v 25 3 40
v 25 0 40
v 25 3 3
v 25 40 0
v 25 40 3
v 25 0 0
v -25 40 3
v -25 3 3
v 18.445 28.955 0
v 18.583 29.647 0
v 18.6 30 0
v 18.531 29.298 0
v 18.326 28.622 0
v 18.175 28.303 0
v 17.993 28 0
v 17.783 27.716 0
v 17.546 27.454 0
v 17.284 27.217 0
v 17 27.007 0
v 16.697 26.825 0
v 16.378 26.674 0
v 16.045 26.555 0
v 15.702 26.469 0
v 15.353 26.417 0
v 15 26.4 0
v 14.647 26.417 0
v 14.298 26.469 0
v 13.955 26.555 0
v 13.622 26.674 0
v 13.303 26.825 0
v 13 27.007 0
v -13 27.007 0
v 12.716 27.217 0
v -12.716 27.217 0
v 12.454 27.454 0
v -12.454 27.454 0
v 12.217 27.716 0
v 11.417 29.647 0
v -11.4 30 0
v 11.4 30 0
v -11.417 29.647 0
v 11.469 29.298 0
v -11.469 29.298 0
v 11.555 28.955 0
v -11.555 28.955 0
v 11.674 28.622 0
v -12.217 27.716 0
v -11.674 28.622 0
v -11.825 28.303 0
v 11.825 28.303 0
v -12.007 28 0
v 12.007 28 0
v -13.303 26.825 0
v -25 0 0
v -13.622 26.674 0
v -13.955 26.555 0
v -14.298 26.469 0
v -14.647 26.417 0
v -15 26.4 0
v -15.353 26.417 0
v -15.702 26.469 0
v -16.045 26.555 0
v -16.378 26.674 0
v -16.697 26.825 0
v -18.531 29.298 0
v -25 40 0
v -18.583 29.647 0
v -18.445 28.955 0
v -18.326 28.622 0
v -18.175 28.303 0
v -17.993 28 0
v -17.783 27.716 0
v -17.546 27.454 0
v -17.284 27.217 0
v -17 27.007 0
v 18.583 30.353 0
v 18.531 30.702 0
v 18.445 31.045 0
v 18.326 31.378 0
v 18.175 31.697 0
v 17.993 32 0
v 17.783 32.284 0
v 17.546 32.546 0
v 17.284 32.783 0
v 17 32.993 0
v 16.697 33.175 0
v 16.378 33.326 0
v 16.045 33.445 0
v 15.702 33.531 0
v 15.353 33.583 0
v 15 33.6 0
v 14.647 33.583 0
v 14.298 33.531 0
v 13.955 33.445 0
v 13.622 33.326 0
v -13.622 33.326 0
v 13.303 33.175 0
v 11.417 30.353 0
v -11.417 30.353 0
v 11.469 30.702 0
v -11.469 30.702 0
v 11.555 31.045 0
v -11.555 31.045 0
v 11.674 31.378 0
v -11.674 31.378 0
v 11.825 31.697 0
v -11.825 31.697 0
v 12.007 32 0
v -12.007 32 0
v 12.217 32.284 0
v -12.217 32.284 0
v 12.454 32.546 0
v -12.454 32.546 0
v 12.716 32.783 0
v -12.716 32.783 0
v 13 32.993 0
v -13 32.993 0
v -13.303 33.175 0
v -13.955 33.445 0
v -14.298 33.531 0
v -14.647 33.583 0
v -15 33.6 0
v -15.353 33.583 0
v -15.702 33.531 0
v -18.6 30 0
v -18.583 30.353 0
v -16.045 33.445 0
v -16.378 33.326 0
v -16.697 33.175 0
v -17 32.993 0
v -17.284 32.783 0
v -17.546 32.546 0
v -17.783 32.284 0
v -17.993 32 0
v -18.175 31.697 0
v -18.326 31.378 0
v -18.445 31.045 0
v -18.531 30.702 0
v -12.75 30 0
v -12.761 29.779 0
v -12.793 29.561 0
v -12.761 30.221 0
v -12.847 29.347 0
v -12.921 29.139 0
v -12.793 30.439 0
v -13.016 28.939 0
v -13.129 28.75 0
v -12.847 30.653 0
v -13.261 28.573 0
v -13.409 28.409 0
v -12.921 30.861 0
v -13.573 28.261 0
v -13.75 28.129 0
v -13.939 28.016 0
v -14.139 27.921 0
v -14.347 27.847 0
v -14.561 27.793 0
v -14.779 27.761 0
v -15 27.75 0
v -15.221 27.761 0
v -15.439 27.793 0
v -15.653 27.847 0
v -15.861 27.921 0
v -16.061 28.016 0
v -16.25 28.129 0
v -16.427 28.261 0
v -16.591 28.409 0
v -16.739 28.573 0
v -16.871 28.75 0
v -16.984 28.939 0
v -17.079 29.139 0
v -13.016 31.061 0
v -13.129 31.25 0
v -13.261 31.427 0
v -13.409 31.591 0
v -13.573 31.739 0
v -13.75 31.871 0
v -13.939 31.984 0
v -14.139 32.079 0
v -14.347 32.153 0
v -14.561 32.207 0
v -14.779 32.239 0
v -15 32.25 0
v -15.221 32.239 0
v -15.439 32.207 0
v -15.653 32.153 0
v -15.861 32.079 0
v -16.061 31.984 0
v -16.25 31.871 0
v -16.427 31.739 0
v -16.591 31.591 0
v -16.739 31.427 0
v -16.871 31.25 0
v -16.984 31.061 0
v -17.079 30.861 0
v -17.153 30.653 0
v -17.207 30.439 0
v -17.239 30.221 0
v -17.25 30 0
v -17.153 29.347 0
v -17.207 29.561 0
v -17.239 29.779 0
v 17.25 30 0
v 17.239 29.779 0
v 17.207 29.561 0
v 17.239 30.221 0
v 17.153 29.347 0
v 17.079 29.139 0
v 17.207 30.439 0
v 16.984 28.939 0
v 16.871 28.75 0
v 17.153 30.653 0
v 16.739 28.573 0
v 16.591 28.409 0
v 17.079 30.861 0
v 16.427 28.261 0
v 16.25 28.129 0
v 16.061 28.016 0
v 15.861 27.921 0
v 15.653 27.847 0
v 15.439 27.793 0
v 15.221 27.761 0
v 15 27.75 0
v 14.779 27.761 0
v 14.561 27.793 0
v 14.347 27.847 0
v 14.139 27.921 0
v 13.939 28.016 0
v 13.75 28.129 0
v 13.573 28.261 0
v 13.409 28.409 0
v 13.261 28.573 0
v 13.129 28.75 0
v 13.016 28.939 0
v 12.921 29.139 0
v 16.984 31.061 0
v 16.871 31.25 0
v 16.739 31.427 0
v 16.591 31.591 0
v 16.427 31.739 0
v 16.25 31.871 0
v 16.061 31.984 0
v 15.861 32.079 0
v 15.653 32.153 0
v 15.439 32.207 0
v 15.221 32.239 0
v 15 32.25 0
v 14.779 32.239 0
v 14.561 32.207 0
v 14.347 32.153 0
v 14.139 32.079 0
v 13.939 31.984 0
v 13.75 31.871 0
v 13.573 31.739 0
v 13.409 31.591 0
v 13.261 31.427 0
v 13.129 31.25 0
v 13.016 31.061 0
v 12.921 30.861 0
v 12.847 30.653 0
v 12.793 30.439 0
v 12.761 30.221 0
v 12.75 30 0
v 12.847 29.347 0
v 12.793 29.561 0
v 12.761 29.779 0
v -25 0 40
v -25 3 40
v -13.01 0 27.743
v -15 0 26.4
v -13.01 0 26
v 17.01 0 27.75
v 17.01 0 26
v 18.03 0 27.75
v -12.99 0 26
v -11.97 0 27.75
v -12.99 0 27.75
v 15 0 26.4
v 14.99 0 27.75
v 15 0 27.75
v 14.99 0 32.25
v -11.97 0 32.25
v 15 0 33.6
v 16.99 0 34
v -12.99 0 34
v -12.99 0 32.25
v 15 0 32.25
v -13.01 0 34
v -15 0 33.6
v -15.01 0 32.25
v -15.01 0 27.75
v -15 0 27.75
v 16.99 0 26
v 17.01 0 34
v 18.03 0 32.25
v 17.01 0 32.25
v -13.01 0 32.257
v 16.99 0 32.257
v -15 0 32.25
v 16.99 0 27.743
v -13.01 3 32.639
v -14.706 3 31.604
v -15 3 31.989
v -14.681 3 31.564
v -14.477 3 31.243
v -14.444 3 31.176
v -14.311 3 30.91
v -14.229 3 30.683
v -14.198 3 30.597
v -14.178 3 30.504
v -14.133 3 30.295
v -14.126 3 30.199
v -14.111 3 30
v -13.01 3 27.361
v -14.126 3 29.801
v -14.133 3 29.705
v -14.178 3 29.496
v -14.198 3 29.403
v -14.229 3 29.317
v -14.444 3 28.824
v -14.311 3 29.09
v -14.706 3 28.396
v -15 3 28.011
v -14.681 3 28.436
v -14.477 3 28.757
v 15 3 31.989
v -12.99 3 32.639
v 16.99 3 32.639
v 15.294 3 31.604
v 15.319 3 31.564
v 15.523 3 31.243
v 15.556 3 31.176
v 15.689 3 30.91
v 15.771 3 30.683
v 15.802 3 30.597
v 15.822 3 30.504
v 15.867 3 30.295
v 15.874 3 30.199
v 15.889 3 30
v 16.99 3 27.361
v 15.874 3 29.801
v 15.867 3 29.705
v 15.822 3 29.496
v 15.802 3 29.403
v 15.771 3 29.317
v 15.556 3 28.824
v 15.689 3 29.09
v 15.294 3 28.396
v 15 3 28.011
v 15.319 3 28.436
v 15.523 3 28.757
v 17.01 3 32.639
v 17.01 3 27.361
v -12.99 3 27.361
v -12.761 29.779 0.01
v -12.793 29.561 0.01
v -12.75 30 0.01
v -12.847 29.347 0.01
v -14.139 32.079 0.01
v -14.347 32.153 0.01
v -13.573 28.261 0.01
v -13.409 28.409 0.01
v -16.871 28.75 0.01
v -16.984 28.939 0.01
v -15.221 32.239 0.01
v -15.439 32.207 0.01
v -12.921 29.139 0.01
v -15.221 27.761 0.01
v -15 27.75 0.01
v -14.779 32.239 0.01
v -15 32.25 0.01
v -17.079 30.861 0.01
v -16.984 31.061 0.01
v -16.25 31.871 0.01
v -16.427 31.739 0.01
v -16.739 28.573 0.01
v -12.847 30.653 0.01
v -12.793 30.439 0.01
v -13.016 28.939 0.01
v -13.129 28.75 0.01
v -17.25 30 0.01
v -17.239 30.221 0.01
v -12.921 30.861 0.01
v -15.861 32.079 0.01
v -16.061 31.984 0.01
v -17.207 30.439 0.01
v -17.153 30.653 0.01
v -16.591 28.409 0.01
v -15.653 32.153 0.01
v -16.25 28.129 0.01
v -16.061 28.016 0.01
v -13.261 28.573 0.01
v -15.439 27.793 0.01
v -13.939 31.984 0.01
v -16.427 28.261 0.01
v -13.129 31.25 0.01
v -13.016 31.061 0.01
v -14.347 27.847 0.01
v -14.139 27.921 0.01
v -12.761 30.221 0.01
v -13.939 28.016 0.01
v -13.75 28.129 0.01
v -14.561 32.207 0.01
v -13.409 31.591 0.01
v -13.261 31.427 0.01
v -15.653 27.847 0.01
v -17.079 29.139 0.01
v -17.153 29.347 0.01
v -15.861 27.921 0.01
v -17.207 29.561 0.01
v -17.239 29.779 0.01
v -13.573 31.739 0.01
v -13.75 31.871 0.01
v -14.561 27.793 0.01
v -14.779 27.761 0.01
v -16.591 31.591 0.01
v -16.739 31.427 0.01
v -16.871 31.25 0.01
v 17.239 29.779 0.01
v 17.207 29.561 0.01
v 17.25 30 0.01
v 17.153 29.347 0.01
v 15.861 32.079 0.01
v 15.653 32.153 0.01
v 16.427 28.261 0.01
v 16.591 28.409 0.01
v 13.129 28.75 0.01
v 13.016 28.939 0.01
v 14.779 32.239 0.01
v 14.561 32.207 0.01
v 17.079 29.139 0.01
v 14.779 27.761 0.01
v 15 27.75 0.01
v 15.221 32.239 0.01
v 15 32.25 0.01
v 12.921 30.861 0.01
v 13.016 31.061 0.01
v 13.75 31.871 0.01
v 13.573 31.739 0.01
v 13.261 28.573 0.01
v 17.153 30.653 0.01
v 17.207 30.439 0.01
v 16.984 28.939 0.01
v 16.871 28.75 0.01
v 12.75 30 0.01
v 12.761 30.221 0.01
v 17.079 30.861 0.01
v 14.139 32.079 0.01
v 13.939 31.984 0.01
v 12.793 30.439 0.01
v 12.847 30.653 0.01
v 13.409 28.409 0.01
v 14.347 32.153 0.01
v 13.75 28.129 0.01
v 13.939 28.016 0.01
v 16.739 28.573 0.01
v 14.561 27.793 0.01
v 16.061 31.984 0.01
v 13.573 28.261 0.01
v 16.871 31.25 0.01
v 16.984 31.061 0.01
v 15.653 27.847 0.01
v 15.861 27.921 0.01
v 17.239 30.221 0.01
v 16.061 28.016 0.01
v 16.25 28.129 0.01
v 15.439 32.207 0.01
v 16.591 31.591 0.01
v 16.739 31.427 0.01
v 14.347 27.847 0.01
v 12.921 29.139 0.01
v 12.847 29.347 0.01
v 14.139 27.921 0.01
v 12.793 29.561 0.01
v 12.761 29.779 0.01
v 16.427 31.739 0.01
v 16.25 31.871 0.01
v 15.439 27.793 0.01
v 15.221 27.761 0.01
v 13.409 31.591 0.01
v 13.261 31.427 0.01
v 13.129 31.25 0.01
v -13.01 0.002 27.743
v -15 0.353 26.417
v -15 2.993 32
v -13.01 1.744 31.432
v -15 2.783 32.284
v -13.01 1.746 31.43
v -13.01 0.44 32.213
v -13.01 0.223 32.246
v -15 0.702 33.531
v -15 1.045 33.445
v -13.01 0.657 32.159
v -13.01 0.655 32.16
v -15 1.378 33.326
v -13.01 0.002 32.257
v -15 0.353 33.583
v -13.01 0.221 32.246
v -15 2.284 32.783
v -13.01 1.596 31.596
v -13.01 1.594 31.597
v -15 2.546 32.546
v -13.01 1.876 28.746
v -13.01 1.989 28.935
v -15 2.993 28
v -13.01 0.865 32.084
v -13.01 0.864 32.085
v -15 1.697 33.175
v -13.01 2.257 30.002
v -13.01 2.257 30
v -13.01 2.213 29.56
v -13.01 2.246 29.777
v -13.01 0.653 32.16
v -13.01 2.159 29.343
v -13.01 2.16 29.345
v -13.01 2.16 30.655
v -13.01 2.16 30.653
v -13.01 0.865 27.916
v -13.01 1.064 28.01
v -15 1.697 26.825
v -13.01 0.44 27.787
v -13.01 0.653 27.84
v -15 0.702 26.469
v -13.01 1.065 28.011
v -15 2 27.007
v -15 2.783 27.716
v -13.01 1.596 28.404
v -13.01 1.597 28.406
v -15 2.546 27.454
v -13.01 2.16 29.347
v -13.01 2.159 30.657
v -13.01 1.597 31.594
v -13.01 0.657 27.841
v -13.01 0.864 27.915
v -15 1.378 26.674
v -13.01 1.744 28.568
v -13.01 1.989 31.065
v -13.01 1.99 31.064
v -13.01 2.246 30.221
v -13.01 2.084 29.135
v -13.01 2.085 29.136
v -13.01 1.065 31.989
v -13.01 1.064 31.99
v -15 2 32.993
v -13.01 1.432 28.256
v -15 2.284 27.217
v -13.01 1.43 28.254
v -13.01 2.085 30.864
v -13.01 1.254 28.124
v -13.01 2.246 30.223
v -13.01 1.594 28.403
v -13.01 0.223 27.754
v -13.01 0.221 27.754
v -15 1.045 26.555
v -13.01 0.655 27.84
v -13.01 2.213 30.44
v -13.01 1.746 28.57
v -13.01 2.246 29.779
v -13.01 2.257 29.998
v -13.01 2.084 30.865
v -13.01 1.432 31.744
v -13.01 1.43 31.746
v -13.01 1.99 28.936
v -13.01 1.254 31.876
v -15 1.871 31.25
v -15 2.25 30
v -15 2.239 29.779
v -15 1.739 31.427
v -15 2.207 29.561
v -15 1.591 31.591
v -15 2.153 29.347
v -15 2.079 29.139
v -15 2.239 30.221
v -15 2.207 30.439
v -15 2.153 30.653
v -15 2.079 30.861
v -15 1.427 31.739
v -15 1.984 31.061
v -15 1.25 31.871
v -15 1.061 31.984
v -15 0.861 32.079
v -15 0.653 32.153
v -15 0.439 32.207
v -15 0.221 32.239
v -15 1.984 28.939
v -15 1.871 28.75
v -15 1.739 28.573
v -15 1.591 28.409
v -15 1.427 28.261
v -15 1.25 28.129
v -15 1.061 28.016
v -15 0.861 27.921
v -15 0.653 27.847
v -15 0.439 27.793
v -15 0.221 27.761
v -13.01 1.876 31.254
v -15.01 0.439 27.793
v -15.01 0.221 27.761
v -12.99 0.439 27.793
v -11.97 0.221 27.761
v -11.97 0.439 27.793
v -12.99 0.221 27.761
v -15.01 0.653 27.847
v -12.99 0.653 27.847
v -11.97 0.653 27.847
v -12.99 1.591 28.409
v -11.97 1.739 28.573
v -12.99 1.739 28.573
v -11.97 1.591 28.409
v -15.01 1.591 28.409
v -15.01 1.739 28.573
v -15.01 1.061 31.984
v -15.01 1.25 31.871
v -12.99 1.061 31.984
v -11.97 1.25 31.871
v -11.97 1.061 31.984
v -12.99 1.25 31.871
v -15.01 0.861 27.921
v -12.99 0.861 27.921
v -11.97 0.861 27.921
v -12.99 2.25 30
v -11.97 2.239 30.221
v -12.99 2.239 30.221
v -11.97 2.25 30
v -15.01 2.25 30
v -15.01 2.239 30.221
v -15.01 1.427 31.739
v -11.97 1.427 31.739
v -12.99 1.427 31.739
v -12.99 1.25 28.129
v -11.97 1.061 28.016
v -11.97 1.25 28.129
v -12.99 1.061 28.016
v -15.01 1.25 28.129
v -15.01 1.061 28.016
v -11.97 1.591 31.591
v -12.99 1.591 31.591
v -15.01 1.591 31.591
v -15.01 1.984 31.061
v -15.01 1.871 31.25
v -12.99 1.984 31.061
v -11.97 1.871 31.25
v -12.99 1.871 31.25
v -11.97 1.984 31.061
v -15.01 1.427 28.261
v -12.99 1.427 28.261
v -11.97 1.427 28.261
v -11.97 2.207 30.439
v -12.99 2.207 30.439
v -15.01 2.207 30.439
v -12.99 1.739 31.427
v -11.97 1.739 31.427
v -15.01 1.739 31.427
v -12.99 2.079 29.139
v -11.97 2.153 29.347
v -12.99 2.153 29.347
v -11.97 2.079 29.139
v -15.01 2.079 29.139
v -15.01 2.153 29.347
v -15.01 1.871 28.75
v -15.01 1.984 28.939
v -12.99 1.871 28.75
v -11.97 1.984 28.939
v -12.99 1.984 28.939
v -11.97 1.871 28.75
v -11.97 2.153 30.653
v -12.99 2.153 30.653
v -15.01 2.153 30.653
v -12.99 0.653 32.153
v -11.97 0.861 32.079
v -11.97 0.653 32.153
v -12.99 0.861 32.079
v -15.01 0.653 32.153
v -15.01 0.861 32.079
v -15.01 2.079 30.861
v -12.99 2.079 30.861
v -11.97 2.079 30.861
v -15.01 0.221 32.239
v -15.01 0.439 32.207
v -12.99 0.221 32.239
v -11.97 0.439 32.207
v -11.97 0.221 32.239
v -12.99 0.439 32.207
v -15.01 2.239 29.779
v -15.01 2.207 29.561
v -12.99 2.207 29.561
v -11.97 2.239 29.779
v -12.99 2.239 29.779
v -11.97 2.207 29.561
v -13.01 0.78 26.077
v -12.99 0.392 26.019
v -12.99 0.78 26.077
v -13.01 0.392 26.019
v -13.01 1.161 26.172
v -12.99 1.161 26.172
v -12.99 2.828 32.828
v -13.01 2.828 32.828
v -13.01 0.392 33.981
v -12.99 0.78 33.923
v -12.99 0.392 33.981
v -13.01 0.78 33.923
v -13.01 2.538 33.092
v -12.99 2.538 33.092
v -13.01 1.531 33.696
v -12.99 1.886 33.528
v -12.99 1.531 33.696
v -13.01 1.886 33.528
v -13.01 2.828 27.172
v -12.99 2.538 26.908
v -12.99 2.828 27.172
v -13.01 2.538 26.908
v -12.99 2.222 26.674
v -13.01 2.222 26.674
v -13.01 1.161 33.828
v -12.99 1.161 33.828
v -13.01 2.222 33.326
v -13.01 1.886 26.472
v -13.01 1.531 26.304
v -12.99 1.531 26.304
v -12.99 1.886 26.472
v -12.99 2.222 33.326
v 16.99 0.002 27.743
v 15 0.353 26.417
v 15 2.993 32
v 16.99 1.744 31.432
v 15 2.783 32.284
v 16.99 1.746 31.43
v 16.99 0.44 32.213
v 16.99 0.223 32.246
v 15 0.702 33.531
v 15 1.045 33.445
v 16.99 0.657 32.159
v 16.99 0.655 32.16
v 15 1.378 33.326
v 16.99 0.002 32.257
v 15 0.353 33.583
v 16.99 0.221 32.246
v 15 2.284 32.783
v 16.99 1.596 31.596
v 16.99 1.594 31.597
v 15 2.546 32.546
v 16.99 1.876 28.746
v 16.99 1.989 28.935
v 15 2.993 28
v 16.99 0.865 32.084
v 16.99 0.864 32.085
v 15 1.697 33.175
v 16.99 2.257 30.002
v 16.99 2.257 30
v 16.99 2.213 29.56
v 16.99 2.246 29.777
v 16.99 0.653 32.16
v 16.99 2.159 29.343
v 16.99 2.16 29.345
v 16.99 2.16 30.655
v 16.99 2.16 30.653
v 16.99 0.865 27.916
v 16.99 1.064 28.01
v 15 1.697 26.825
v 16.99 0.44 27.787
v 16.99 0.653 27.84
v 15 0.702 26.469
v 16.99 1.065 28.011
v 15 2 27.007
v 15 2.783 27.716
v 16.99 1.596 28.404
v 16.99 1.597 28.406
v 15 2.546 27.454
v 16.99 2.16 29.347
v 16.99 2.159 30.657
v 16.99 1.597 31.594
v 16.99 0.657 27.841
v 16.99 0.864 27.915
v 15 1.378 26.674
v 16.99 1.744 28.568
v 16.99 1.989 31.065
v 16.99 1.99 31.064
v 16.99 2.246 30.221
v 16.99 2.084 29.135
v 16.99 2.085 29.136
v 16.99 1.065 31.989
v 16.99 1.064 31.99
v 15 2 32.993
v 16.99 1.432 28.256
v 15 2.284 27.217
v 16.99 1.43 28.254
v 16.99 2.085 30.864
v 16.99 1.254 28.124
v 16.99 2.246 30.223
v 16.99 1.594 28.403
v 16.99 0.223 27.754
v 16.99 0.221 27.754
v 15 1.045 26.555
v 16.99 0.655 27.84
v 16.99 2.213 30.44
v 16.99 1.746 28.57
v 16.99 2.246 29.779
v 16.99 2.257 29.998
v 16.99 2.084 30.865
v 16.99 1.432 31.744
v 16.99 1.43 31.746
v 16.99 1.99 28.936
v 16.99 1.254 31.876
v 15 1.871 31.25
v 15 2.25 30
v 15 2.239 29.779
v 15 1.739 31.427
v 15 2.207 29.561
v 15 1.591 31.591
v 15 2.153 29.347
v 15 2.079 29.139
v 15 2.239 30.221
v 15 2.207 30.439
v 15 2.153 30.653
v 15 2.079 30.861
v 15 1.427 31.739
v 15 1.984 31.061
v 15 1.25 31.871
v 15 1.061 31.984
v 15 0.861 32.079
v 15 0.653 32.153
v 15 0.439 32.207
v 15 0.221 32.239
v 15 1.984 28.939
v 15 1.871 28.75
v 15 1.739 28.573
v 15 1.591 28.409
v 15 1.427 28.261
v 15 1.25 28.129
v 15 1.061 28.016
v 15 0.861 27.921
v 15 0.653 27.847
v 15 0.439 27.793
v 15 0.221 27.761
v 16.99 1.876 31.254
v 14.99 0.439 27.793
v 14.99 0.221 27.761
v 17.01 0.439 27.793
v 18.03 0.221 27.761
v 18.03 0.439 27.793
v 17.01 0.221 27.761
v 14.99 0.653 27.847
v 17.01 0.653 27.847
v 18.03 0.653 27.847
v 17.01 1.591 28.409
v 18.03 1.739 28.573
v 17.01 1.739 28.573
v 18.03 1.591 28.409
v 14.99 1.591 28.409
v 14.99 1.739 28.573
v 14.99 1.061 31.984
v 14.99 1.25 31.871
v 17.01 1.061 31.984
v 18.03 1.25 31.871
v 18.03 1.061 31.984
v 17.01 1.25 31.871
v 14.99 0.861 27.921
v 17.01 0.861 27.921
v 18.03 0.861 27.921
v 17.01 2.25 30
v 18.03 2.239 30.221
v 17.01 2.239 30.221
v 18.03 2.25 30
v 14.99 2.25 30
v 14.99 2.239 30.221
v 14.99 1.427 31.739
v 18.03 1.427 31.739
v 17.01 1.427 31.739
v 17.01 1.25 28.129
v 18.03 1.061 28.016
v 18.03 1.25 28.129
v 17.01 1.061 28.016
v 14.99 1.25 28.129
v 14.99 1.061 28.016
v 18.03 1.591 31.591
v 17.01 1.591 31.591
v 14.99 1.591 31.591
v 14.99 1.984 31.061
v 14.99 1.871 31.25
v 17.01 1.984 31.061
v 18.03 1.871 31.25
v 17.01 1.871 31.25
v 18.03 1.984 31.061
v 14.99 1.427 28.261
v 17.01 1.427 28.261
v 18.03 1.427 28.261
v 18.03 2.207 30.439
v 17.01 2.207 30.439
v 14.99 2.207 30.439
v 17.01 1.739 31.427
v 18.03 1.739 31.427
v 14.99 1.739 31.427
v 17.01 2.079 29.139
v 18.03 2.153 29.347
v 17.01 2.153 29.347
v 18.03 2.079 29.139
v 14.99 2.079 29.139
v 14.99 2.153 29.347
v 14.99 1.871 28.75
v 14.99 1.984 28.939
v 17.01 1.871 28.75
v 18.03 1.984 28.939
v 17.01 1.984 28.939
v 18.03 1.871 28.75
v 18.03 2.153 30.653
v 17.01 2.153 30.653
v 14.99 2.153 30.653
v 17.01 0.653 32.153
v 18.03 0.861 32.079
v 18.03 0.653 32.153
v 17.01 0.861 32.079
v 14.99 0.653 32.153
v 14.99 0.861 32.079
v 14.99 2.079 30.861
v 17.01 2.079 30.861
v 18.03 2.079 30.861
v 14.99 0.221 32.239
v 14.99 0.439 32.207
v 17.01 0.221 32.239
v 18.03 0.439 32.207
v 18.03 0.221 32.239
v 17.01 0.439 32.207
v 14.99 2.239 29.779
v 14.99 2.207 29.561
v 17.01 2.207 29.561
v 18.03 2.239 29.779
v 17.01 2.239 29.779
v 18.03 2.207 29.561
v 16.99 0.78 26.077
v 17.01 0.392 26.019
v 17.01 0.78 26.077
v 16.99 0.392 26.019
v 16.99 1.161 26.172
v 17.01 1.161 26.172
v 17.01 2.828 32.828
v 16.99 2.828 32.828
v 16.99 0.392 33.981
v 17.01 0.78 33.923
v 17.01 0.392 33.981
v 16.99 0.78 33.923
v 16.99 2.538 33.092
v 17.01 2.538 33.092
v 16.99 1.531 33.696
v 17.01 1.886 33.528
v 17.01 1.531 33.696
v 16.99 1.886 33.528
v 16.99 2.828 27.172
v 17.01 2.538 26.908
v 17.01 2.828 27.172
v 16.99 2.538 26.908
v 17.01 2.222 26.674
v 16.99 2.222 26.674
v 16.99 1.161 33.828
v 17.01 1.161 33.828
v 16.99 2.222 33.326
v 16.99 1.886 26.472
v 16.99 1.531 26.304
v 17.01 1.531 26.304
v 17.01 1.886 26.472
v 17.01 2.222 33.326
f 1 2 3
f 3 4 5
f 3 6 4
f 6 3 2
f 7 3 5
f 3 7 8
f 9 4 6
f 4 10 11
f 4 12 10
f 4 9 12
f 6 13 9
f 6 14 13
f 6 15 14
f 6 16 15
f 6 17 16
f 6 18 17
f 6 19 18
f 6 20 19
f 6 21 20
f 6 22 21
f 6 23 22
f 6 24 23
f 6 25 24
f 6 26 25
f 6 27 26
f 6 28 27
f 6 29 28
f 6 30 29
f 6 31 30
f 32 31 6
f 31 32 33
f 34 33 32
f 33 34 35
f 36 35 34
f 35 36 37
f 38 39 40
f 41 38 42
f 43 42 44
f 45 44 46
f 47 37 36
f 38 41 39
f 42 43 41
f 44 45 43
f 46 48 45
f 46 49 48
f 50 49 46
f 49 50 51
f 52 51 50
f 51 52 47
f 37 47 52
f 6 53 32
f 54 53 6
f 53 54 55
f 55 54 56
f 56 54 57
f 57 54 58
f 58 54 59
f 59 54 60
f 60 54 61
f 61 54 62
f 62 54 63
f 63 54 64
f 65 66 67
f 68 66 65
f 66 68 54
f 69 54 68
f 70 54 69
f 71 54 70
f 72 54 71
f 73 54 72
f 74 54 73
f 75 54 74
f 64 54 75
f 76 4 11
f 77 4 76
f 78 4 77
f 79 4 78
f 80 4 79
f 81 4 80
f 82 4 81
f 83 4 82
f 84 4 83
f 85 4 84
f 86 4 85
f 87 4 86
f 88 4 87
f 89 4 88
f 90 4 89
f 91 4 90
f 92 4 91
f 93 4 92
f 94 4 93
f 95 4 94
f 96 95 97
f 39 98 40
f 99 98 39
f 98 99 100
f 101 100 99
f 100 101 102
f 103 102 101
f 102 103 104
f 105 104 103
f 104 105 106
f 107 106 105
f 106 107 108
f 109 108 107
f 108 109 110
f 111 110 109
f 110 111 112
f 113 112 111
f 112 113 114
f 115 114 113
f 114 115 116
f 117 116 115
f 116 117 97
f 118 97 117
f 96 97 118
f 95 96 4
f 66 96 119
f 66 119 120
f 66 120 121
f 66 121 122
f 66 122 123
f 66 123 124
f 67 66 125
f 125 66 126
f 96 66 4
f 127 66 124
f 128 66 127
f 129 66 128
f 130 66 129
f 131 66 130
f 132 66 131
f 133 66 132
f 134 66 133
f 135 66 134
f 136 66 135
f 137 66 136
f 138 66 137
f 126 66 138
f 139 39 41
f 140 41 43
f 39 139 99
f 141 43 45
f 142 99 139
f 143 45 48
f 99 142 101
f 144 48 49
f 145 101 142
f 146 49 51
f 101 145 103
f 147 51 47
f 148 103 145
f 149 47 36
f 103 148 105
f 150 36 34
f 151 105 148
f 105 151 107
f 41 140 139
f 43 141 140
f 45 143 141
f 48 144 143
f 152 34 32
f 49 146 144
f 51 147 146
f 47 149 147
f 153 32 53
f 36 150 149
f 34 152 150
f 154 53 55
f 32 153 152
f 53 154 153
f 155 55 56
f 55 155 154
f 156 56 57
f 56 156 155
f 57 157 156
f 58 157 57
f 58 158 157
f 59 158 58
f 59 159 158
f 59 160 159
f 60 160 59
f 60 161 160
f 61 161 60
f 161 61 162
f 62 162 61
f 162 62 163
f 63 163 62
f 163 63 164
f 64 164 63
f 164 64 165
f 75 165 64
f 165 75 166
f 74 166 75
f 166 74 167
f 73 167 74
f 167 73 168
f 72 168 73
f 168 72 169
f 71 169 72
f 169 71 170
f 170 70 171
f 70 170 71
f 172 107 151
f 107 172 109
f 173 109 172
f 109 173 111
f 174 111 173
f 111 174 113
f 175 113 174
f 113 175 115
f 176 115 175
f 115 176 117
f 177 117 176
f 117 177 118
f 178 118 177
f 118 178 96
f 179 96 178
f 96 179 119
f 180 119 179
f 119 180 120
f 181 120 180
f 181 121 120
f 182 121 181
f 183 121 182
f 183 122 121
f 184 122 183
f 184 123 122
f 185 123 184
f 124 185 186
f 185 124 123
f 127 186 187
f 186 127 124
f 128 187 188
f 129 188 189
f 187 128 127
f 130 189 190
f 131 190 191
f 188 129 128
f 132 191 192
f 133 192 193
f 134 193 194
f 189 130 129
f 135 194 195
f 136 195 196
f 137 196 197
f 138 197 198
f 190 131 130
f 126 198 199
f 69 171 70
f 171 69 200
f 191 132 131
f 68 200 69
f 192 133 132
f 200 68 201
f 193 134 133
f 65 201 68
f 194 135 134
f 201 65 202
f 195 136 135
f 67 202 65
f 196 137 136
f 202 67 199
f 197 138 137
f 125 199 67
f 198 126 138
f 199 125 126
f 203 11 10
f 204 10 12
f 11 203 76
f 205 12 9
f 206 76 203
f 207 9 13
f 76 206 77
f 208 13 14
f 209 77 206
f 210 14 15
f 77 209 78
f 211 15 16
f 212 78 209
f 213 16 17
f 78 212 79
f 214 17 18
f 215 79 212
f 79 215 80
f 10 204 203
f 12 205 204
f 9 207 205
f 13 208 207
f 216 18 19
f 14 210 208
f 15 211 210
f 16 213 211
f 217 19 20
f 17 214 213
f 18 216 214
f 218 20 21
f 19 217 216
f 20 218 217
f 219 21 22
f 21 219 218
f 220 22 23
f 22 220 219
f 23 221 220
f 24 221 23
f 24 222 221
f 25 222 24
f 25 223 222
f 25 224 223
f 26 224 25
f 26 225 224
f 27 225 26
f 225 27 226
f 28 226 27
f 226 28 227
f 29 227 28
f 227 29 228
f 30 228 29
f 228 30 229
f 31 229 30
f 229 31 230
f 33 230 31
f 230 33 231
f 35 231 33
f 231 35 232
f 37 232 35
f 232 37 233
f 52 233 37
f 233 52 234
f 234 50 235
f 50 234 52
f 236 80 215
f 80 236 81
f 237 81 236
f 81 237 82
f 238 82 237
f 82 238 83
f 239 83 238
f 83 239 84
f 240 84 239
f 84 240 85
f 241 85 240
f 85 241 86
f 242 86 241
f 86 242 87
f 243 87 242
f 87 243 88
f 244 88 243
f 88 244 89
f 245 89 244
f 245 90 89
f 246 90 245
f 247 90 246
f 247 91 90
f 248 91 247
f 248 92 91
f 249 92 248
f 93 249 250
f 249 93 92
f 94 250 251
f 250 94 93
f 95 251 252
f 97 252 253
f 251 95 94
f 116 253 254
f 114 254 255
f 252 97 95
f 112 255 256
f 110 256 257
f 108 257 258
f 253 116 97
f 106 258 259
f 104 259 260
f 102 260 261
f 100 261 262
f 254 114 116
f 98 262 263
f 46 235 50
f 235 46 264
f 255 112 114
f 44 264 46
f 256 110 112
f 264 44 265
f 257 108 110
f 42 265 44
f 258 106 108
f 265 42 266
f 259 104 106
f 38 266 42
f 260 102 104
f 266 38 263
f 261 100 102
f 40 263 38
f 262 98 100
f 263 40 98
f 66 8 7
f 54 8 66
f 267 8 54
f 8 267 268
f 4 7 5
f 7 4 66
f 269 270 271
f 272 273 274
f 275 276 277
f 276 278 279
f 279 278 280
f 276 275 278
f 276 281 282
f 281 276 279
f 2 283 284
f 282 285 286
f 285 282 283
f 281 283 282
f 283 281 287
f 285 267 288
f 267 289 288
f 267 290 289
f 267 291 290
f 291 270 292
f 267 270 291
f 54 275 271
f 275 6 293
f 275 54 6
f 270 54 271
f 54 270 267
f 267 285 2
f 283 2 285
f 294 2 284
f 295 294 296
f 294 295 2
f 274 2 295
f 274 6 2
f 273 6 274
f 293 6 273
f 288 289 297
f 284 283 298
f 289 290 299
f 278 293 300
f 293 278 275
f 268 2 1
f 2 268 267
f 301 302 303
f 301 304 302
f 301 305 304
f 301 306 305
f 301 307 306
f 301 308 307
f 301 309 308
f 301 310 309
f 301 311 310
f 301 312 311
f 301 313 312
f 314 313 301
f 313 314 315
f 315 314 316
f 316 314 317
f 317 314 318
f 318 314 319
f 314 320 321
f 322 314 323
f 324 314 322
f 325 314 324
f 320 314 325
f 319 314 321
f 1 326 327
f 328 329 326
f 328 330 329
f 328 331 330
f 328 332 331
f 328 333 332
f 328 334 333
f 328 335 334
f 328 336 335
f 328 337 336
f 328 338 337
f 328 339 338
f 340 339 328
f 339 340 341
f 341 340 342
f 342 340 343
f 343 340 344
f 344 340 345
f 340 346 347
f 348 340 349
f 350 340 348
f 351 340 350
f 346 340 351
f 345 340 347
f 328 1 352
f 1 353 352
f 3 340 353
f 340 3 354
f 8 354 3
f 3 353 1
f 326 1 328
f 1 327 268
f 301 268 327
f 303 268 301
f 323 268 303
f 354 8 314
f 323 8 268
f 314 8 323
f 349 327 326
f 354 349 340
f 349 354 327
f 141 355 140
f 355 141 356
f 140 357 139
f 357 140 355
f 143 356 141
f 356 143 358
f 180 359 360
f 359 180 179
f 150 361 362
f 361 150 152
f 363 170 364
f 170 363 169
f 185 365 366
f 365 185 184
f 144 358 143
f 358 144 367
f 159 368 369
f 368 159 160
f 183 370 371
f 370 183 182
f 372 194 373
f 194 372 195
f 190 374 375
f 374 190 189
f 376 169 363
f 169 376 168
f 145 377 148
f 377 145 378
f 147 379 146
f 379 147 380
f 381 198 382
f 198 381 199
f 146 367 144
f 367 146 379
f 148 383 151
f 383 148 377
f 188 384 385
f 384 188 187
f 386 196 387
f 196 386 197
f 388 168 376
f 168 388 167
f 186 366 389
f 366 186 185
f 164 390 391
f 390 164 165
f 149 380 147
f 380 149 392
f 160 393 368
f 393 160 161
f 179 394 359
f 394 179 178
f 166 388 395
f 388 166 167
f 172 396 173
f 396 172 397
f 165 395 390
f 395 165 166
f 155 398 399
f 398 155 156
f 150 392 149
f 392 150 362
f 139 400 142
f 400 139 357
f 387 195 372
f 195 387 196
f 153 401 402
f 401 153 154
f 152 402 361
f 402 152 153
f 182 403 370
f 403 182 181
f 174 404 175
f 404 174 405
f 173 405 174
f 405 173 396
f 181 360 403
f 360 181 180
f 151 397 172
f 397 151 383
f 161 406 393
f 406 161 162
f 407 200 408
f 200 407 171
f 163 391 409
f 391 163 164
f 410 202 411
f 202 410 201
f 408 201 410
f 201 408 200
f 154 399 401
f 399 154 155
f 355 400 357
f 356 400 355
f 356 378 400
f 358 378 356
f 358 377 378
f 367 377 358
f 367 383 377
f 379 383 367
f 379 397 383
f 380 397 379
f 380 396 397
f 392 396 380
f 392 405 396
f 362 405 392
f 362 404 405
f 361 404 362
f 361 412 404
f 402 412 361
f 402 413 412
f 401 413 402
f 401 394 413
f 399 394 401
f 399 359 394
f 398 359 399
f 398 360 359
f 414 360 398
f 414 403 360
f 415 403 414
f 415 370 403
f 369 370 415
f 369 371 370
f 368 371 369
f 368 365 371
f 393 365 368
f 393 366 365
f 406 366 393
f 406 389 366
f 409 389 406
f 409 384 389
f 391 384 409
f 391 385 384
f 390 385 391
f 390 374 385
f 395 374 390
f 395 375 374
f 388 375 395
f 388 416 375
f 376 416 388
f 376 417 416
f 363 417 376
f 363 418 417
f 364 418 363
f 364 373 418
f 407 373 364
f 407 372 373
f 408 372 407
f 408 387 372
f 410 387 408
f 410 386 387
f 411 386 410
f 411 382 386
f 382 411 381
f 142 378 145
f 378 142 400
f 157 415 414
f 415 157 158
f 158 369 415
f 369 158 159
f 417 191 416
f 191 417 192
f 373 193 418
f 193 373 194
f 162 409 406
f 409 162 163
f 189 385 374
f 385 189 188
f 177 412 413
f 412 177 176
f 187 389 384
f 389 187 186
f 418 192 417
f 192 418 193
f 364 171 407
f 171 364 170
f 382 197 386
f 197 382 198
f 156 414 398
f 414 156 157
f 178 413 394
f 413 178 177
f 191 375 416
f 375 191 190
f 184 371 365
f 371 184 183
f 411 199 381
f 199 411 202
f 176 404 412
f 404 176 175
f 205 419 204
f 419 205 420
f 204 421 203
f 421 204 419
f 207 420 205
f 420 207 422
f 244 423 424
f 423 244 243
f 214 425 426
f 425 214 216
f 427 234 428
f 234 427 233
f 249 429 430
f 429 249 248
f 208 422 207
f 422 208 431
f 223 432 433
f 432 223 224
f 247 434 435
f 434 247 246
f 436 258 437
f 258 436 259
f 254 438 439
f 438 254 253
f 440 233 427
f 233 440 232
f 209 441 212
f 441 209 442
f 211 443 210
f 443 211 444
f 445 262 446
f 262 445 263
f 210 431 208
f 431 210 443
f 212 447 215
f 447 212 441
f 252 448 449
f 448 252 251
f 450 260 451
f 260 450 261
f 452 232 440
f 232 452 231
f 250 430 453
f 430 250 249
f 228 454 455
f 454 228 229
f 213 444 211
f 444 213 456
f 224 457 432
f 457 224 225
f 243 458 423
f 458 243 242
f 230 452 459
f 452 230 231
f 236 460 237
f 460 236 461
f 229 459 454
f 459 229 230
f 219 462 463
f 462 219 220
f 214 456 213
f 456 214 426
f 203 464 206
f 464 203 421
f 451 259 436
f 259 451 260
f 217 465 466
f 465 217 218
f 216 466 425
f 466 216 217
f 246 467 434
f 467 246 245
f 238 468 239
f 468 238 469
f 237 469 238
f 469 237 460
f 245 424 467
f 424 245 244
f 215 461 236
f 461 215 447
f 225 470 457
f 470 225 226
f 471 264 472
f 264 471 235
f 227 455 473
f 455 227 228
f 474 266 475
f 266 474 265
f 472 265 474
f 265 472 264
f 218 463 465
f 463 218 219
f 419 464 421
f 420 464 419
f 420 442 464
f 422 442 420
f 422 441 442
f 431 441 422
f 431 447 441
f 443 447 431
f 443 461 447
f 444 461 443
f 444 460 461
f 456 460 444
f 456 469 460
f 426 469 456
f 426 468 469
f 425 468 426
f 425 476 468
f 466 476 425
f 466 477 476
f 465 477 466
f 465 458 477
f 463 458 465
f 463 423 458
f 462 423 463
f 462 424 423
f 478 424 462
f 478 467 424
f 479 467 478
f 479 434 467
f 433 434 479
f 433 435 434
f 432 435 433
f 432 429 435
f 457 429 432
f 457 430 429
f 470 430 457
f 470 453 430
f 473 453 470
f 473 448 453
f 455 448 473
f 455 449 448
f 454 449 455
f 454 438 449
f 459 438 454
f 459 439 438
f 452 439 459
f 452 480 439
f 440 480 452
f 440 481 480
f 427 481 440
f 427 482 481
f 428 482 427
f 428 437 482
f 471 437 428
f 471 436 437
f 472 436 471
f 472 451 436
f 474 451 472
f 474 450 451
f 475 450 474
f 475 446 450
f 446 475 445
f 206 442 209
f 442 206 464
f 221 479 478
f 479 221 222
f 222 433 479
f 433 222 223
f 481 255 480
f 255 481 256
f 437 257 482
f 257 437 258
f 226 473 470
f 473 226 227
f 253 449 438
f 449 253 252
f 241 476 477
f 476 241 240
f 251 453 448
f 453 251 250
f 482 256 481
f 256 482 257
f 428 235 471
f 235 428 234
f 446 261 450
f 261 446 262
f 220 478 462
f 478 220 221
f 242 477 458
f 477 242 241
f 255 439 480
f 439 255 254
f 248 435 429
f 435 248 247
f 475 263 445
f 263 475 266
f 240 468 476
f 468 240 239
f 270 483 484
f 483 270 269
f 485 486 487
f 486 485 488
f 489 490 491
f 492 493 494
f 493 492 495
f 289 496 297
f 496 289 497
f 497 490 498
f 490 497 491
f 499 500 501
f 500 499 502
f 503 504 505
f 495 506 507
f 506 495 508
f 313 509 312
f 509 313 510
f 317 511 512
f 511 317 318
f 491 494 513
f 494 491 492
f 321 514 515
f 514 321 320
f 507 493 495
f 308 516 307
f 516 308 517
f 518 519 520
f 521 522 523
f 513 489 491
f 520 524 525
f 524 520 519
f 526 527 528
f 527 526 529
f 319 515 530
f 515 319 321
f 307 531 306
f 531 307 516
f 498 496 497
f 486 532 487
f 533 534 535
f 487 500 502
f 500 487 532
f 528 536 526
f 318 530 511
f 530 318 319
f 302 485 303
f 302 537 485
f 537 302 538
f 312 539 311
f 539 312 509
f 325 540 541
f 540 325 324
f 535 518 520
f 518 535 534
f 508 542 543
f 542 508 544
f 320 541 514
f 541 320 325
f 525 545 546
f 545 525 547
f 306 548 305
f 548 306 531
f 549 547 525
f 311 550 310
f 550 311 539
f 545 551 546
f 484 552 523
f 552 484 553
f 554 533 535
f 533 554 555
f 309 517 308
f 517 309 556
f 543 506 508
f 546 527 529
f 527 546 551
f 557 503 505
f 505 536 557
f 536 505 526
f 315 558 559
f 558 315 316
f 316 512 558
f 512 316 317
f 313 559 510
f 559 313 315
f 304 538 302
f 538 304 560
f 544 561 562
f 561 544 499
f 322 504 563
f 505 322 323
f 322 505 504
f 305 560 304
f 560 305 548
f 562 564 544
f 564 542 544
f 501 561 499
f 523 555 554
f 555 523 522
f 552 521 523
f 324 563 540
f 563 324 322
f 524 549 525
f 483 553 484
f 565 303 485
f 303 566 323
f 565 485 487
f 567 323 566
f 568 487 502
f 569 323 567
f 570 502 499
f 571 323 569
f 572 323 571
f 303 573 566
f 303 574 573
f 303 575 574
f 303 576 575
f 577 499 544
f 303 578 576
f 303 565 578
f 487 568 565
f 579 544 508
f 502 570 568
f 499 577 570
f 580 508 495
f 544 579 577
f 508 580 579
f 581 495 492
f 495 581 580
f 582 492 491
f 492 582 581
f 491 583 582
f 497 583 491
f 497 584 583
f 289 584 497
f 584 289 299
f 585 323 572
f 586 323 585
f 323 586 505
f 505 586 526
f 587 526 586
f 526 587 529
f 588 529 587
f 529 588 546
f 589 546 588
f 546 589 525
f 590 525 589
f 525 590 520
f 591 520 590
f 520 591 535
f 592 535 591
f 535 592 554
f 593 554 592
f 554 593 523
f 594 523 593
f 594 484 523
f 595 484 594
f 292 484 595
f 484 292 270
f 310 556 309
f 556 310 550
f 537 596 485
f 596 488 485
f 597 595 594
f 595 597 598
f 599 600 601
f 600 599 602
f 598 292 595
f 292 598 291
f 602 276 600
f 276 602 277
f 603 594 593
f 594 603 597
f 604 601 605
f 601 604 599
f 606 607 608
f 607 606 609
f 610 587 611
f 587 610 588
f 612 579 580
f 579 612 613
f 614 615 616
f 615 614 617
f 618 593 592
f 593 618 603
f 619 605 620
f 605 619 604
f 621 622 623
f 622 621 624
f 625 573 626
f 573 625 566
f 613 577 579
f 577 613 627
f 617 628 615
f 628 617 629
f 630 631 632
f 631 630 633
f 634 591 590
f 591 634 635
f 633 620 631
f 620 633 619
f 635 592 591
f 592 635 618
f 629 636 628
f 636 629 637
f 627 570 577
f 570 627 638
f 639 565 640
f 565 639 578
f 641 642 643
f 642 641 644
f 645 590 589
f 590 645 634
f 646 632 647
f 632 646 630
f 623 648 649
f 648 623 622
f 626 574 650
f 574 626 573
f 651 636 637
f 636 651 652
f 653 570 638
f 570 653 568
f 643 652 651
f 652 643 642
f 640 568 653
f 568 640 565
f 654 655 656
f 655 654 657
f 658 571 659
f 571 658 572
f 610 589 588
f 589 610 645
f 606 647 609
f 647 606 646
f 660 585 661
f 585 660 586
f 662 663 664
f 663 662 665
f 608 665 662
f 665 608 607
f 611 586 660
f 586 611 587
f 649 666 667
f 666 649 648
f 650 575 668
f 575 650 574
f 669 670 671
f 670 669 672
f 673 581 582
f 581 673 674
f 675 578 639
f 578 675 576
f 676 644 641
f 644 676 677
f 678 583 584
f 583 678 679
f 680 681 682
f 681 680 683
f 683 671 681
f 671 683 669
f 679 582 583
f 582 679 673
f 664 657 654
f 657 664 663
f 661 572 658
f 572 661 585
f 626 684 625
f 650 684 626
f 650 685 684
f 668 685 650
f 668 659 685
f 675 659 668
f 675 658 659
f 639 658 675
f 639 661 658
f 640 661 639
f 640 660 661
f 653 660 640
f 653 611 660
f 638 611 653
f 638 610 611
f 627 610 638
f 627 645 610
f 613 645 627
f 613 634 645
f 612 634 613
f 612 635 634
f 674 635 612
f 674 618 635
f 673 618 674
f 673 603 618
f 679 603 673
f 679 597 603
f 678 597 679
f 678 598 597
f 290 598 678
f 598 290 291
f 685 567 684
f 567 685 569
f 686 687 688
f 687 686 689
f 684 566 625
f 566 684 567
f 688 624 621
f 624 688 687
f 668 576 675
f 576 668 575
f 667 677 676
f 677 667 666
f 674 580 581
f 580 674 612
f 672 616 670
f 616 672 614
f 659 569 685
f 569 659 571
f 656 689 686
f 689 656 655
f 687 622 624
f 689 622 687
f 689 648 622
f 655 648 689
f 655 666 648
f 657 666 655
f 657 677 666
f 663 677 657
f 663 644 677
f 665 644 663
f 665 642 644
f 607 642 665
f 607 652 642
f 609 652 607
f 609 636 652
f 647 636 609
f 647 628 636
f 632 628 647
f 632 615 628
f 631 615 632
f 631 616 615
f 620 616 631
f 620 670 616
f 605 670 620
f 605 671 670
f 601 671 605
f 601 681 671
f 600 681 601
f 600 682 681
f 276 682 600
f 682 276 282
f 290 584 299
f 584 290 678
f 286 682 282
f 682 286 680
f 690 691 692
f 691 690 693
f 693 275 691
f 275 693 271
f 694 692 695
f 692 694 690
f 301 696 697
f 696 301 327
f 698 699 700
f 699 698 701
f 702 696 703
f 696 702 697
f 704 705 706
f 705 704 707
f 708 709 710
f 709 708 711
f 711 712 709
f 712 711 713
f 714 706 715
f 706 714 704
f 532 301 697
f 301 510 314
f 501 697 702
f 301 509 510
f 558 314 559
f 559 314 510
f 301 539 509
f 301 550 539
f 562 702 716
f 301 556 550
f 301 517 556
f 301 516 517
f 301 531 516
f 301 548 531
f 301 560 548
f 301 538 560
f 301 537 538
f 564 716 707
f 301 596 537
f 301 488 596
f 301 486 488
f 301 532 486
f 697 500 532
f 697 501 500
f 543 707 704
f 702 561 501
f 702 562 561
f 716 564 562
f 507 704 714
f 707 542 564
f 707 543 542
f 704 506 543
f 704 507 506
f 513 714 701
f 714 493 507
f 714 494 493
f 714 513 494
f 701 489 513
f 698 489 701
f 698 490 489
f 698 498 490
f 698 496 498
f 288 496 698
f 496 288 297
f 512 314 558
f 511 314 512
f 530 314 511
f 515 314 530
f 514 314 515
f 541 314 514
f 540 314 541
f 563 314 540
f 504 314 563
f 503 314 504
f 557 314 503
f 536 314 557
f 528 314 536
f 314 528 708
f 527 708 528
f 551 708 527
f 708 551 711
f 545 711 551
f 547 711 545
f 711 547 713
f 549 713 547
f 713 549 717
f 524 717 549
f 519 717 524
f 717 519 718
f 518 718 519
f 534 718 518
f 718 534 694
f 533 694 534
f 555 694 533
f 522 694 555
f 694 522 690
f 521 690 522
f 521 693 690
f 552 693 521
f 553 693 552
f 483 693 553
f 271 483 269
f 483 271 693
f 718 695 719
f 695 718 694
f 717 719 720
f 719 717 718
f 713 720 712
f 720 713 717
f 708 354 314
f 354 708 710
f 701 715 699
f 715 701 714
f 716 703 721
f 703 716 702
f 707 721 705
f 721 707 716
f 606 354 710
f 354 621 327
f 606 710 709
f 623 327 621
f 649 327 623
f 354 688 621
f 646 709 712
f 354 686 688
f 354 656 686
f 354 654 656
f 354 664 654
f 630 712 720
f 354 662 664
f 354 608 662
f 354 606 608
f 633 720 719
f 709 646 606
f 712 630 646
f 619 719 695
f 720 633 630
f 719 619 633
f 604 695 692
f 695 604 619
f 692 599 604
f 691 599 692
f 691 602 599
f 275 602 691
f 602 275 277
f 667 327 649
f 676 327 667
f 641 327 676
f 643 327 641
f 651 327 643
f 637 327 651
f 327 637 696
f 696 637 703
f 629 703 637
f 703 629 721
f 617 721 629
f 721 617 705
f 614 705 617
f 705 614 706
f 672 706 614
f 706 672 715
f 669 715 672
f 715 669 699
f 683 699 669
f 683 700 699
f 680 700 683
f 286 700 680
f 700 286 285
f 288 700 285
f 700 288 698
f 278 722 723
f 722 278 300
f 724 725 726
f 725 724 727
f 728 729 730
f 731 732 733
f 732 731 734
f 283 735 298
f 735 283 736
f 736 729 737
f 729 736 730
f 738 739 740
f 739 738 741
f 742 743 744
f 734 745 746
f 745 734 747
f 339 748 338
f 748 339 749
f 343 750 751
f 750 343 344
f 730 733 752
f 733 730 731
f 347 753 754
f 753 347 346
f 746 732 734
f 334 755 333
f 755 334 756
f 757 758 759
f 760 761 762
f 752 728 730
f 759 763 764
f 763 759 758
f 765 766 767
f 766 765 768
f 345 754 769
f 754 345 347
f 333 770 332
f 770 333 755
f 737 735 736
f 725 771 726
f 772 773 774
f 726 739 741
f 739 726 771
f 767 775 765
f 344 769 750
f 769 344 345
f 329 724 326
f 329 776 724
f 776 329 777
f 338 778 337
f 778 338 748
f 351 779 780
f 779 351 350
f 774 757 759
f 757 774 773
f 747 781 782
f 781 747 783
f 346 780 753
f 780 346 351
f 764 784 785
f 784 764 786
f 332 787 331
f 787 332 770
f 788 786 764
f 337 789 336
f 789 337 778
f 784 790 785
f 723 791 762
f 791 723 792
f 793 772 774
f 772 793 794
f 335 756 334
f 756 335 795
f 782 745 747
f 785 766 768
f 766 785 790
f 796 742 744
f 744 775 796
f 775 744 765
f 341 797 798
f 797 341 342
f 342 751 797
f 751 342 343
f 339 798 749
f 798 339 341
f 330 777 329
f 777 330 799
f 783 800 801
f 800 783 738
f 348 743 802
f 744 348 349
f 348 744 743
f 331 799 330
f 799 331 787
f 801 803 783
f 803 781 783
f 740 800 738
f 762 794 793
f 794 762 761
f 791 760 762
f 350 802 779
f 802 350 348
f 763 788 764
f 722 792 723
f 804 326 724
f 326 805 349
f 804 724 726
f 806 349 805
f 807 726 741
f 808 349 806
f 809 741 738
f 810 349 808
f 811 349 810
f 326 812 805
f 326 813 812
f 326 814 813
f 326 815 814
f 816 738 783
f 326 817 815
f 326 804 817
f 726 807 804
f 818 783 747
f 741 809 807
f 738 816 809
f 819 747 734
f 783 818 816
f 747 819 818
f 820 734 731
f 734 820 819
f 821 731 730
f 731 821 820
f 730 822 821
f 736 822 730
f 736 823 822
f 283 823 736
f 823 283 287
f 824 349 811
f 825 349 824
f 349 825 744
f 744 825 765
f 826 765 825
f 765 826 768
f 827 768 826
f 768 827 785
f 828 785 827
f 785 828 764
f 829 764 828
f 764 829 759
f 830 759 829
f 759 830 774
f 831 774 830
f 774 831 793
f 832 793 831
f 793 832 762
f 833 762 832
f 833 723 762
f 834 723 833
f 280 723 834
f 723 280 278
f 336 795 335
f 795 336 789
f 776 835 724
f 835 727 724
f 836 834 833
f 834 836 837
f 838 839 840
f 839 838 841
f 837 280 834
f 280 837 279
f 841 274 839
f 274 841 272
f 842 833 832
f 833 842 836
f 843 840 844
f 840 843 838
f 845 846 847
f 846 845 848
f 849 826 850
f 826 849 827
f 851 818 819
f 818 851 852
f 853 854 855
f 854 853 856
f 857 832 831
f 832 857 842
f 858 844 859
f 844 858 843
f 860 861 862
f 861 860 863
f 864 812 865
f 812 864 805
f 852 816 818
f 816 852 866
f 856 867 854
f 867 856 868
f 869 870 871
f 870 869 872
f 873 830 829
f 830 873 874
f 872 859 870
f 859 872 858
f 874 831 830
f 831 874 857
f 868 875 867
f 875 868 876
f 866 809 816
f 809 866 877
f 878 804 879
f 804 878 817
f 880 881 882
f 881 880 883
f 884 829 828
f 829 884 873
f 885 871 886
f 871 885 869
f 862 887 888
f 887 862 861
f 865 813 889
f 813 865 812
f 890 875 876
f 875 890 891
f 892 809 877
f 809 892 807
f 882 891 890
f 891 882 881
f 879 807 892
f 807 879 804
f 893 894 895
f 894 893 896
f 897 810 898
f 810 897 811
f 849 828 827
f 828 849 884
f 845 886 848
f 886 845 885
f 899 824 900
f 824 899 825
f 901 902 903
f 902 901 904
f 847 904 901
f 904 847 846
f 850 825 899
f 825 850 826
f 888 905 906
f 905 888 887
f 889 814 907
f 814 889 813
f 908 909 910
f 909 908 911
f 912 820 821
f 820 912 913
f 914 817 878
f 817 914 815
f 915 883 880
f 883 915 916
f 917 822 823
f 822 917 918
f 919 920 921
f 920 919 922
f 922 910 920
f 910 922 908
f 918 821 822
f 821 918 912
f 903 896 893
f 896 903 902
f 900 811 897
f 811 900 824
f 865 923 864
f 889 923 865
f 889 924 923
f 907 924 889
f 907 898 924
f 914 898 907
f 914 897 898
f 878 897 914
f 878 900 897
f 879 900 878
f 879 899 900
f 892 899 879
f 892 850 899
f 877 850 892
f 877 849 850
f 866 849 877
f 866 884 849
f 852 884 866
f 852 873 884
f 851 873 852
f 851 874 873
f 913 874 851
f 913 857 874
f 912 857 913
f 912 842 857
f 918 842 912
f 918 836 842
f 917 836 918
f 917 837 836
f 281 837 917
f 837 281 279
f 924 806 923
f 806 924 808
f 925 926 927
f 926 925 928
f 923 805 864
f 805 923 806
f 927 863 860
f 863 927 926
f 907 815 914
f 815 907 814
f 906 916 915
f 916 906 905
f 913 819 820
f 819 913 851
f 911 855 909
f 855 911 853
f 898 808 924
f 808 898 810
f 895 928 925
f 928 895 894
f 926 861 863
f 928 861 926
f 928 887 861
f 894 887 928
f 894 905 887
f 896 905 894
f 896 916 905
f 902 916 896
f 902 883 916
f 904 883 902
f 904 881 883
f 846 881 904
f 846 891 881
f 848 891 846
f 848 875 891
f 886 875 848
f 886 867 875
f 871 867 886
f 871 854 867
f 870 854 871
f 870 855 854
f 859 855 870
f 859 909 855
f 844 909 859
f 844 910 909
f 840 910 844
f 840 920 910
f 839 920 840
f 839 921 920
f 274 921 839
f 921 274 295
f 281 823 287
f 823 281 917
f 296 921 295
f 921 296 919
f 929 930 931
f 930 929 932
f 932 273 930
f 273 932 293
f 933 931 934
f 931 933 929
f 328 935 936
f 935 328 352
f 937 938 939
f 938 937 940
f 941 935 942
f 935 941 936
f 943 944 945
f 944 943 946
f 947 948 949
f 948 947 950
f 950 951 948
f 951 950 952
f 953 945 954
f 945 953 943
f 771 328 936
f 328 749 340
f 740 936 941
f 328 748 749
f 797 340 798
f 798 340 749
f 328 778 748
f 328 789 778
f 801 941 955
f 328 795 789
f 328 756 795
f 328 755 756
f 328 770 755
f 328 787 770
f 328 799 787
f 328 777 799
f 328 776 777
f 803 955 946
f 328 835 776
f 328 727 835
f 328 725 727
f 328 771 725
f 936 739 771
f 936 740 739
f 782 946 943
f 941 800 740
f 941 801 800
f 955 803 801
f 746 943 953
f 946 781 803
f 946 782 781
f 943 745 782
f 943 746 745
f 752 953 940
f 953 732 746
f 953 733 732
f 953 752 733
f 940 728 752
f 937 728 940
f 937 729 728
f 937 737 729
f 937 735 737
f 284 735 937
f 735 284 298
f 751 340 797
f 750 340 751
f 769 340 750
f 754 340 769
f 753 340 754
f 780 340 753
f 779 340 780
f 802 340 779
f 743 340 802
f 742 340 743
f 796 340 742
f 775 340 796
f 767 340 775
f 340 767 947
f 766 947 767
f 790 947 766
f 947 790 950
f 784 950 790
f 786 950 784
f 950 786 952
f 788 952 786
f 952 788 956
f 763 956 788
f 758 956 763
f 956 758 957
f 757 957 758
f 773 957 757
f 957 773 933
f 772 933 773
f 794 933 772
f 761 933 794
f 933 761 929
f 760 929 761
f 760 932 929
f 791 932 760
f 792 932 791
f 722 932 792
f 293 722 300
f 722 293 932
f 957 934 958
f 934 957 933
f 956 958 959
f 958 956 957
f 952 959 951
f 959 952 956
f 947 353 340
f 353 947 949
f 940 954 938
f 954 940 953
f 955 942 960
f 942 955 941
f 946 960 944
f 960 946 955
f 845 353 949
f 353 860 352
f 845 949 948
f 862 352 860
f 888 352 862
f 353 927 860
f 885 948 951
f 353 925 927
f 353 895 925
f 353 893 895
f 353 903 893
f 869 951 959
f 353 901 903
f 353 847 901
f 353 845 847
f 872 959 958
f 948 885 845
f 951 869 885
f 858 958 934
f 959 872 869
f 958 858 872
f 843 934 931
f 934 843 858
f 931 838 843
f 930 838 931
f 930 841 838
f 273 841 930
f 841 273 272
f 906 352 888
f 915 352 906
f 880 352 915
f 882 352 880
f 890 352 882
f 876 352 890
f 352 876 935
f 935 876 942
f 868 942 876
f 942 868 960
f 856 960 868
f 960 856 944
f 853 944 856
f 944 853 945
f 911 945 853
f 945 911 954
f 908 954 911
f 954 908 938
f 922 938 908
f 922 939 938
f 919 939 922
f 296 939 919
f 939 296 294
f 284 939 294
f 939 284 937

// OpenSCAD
// L-bracket (M4 countersunk holes)
$fn = 64;

module countersunk_hole_through(shaft_d=4.5, head_d=8, head_depth=2, through=100) {
    // Countersink (cone frustum) for head seat
    cylinder(h=head_depth, d1=head_d*0.9, d2=shaft_d, center=false);
    // Through hole
    translate([0,0,-0.01])
        cylinder(h=through + 0.02, d=shaft_d, center=false);
    // Optional: flat top at head seat (keeps seat crisp)
    translate([0,0,head_depth-0.01])
        cylinder(h=0.02, d=head_d, center=false);
}

module l_bracket() {
    // Dimensions
    w = 50;      // width (X)
    d = 40;      // depth (Y) for horizontal flange, and height (Z) for vertical flange
    t = 3;       // thickness
    corner = 0;  // inner corner at origin

    // Positions for holes: 10mm from outer edge, symmetric.
    // For each flange, X coordinate is centered at w/2, and Y/Z coordinate is measured from outer edge.
    // Outer edge along that flange is at +d (since inner corner at 0).
    hole_x_offsets = [- (w/2 - 10), + (w/2 - 10)]; // left/right along X
    hole_y = d - 10; // from outer edge back toward inner corner for horizontal flange
    hole_z = d - 10; // from outer edge down toward inner corner for vertical flange

    union() {
        // Horizontal flange: +Y direction from inner corner, located at Z in [0, t]
        translate([ -w/2, 0, 0 ])
            cube([w, d, t]);

        // Vertical flange: +Z direction from inner corner, located at Y in [0, t]
        translate([ -w/2, 0, 0 ])
            rotate([0, -90, 0]) // align thickness along Y, height along Z
                cube([t, d, w], center=false);
        // The above construction: cube([t, d, w]) with rotation around Y is awkward;
        // Instead, create explicitly:
        // (Overwritten below; keep first two lines for clarity but final geometry is fixed with explicit model.)
    }
}

// Rebuild explicitly for robustness
module l_bracket_explicit() {
    w = 50;
    d = 40;
    t = 3;

    hole_x_offsets = [- (w/2 - 10), + (w/2 - 10)];
    hole_y = d - 10;
    hole_z = d - 10;

    difference() {
        union() {
            // Horizontal flange (XY plane thickness in Z)
            translate([ -w/2, 0, 0 ])
                cube([w, d, t]);

            // Vertical flange (YZ plane thickness in Y)
            translate([ -w/2, 0, 0 ])
                cube([w, t, d]);
        }

        // Holes in horizontal flange (through in Y? Actually through thickness in Z)
        // Each hole: countersink from outer side => outer side is -Y for horizontal flange? Let's infer:
        // Horizontal flange extends +Y; outer face is at +Y? Bolt head should be on outside of the L bracket.
        // For horizontal flange, bolt head should be on the side facing away from vertical flange: that's +Y (outer).
        // Therefore countersink should face +Y direction; with our hole axis along Z, "facing" is not meaningful.
        // We'll place countersink cone top facing +Z for horizontal? Countersink normal is along Z.
        // Outer side for horizontal flange is +Z (top surface away from base). We'll countersink from +Z.
        for (x = hole_x_offsets) {
            translate([x, hole_y, t - 0.001])
                rotate([180,0,0])
                    countersunk_hole_through(shaft_d=4.5, head_d=8, head_depth=2, through= t + 0.02);

            // Note: above rotate flips countersink to face downward; adjust to ensure countersink on +Z side.
            // We instead explicitly cut with countersink from +Z side:
            translate([x, hole_y, 0])
                countersunk_hole_through(shaft_d=4.5, head_d=8, head_depth=2, through= t + 0.02);
        }

        // Remove duplicate holes? We'll correct by using only one set per flange:
        // To avoid unintended double subtraction, implement properly below by commenting out above duplication.
    }
}

// Correct implementation without duplication
module l_bracket_final() {
    w = 50;
    d = 40;
    t = 3;

    hole_x_offsets = [- (w/2 - 10), + (w/2 - 10)];
    hole_y = d - 10;
    hole_z = d - 10;

    difference() {
        union() {
            // Horizontal flange: +Y, thickness in Z
            translate([ -w/2, 0, 0 ])
                cube([w, d, t]);

            // Vertical flange: +Z, thickness in Y
            translate([ -w/2, 0, 0 ])
                cube([w, t, d]);
        }

        // Horizontal flange holes (axis: Z through thickness)
        // Countersink seat should be on outer side: for horizontal flange, outer is +Z (top).
        // Create countersink cone with flat seat at +Z side.
        for (x = hole_x_offsets) {
            // Cut countersink + through in Z within [0..t]
            translate([x, hole_y, 0])
                // Countersink cone will occupy up to +head_depth from this origin,
                // so place at bottom and cut; but want cone from +Z:
                // Easiest: build a cone pointing downward and cut through.
                // We'll place module and then flip it so the cone points toward -Z (seat at +Z).
                rotate([180,0,0])
                    countersunk_hole_through(shaft_d=4.5, head_d=8, head_depth=2, through=t + 0.02);
        }

        // Vertical flange holes (axis: Y through thickness)
        // Outer side for vertical flange is +X? Actually flange extends +Z, thickness in Y.
        // Outer side should be away from inside corner; for vertical flange, inside face is at Y=0,
        // outer face is at Y=t. Countersink seat should face +Y (bolt head side).
        for (x = hole_x_offsets) {
            // Holes located on centerline: along X, and at height hole_z from outer edge at +Z
            translate([x, 0, hole_z])
                rotate([0,90,0]) // make hole axis along +Y (since default axis is Z)
                    countersunk_hole_through(shaft_d=4.5, head_d=8, head_depth=2, through=t + 0.02);
        }
    }
}

l_bracket_final();
